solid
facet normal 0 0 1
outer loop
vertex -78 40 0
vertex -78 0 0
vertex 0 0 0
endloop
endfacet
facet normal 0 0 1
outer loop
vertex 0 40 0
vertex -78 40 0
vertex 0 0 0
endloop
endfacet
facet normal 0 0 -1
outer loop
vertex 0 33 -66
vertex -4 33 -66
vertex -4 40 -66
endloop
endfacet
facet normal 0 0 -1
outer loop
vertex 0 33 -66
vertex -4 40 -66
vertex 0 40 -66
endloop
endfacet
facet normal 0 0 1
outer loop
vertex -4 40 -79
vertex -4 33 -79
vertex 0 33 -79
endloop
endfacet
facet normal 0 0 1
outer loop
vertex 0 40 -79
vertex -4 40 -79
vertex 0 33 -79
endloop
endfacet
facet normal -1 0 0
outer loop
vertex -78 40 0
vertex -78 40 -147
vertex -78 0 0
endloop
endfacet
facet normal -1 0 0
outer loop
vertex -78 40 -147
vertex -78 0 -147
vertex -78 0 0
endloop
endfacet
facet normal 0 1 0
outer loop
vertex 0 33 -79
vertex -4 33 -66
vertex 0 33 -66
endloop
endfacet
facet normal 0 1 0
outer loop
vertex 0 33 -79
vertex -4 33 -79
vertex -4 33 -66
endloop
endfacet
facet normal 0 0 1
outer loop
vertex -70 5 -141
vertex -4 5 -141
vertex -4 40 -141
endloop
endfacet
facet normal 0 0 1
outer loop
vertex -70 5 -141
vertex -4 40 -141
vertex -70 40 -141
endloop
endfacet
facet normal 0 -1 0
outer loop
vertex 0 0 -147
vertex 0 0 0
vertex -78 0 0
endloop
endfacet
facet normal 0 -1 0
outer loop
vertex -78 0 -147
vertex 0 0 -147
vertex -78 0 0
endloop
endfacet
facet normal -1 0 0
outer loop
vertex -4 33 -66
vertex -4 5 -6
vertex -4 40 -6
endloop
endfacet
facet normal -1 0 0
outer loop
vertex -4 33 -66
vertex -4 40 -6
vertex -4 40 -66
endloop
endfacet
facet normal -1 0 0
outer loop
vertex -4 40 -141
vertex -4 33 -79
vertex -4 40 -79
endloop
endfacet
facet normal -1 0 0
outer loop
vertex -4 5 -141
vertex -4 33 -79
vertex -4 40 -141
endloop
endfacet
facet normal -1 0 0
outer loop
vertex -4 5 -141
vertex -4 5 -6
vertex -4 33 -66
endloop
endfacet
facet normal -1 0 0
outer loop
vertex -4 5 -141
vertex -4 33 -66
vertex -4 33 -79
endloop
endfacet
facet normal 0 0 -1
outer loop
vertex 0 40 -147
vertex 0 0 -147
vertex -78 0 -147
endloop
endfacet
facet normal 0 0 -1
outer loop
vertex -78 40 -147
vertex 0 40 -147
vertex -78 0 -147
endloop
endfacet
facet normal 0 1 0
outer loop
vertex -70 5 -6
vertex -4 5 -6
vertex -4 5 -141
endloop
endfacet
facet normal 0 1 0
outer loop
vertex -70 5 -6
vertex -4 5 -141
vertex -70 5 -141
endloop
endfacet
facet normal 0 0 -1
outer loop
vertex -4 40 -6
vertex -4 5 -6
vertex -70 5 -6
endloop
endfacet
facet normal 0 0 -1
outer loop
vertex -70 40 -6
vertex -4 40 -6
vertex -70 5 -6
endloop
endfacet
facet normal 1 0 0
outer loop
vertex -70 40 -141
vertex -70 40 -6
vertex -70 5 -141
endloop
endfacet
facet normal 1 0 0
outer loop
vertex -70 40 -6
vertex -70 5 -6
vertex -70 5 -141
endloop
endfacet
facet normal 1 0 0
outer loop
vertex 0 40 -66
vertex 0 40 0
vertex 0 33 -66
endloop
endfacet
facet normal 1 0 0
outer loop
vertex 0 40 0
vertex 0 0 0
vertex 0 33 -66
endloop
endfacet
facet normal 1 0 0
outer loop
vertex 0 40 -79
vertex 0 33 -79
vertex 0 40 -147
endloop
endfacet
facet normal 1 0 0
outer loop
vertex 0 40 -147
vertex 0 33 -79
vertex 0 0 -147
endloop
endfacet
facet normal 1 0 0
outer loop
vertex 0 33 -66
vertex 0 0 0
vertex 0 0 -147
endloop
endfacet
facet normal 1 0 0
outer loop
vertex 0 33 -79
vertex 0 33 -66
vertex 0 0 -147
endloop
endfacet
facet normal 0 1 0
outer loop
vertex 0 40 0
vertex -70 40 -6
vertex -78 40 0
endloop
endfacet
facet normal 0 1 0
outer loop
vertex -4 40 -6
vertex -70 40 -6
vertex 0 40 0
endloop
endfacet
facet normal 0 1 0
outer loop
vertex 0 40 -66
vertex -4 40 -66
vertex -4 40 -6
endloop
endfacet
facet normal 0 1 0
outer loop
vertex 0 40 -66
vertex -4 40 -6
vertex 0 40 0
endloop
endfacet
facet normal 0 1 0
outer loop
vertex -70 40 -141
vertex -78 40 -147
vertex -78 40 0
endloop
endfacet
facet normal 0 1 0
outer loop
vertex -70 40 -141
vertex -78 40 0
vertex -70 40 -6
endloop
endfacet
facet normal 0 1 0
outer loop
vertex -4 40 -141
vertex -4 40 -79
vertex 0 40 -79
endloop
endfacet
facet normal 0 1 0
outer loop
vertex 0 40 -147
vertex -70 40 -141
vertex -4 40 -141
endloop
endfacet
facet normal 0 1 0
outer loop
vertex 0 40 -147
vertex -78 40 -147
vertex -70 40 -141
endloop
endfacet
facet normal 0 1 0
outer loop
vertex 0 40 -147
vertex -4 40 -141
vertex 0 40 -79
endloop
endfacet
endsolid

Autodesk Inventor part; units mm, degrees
ref_plane "YZ Plane" through (0, 0, 0) normal (1, 0, 0) x (0, 1, 0)
ref_plane "XZ Plane" through (0, 0, 0) normal (0, 1, 0) x (-1, 0, 0)
ref_plane "XY Plane" through (0, 0, 0) normal (0, 0, 1) x (1, 0, 0)
sketch "Sketch1" plane through (0, 0, 0) normal (0, 1, 0) x (-1, 0, 0)
  point P0 (0, 0)
sketch "Sketch2" plane through (0, 0, 0) normal (0, 1, 0) x (-1, 0, 0)
  line L0 (0, 0) -> (0, -147)
  line L1 (0, -147) -> (78, -147)
  line L2 (78, -147) -> (78, 0)
  line L3 (78, 0) -> (0, 0)
  dimension "d0" = 147
  dimension "d1" = 78
extrude "Extrusion1" add sketch "Sketch2" along normal blind 5
sketch "Sketch3" plane through (0, 5, 0) normal (0, 1, 0) x (1, 0, 0)
  line L0 (0, 0) -> (0, 147) projected
  line L1 (-78, 0) -> (0, 0) projected
  line L2 (0, 0) -> (-4, 0)
  line L3 (-4, 0) -> (-4, 66)
  line L4 (-4, 66) -> (0, 66)
  dimension "d4" = 4
  dimension "d5" = 66
extrude "Extrusion2" add sketch "Sketch3" along normal blind 35
sketch "Sketch4" plane through (0, 5, 0) normal (0, 1, 0) x (1, 0, 0)
  line L0 (-4, 66) -> (0, 66) projected
  line L1 (0, 66) -> (0, 147) projected
  line L2 (0, 66) -> (0, 79)
  line L3 (0, 79) -> (-4, 79)
  line L4 (-4, 79) -> (-4, 66)
  point P0 (0, 0)
  dimension "d8" = 13
extrude "Extrusion3" add sketch "Sketch4" along normal blind 28
sketch "Sketch5" plane through (0, 5, 0) normal (0, 1, 0) x (1, 0, 0)
  line L0 (-4, 79) -> (0, 79) projected
  line L1 (0, 79) -> (0, 147) projected
  line L2 (0, 147) -> (-78, 147) projected
  line L3 (-4, 79) -> (-4, 147)
  line L4 (0, 147) -> (0, 79)
  point P0 (0, 0)
extrude "Extrusion4" add sketch "Sketch5" along normal blind 35
sketch "Sketch6" plane through (0, 5, 0) normal (0, 1, 0) x (1, 0, 0)
  line L0 (-4, 0) -> (-4, 147) projected
  line L1 (-4, 147) -> (-78, 147) projected
  line L2 (-78, 147) -> (-78, 0) projected
  line L3 (-4, 147) -> (-4, 141)
  line L4 (-4, 141) -> (-78, 141)
  line L5 (-78, 147) -> (-4, 147)
  point P0 (0, 0)
  dimension "d13" = 6
extrude "Extrusion5" add sketch "Sketch6" along normal blind 35
sketch "Sketch7" plane through (0, 5, 0) normal (0, 1, 0) x (1, 0, 0)
  line L0 (-4, 141) -> (-78, 141) projected
  line L1 (-78, 141) -> (-78, 0) projected
  line L2 (-78, 0) -> (-4, 0) projected
  line L3 (-78, 141) -> (-78, 0)
  line L4 (-78, 0) -> (-70, 0)
  line L5 (-70, 0) -> (-70, 141)
  point P0 (0, 0)
  dimension "d16" = 8
extrude "Extrusion6" add sketch "Sketch7" along normal blind 35
sketch "Sketch8" plane through (0, 5, 0) normal (0, 1, 0) x (1, 0, 0)
  line L0 (-70, 141) -> (-70, 0) projected
  line L1 (-70, 0) -> (-4, 0) projected
  line L2 (-4, 0) -> (-4, 141) projected
  line L3 (-4, 141) -> (-70, 141) projected
  line L4 (-4, 0) -> (-70, 0)
  line L5 (-4, 0) -> (-4, 6)
  line L6 (-4, 6) -> (-70, 6)
  point P0 (0, 0)
  dimension "d19" = 6
extrude "Extrusion7" add sketch "Sketch8" along normal blind 35 contours L6 L2 L1 L0
properties part number "caixav2"
